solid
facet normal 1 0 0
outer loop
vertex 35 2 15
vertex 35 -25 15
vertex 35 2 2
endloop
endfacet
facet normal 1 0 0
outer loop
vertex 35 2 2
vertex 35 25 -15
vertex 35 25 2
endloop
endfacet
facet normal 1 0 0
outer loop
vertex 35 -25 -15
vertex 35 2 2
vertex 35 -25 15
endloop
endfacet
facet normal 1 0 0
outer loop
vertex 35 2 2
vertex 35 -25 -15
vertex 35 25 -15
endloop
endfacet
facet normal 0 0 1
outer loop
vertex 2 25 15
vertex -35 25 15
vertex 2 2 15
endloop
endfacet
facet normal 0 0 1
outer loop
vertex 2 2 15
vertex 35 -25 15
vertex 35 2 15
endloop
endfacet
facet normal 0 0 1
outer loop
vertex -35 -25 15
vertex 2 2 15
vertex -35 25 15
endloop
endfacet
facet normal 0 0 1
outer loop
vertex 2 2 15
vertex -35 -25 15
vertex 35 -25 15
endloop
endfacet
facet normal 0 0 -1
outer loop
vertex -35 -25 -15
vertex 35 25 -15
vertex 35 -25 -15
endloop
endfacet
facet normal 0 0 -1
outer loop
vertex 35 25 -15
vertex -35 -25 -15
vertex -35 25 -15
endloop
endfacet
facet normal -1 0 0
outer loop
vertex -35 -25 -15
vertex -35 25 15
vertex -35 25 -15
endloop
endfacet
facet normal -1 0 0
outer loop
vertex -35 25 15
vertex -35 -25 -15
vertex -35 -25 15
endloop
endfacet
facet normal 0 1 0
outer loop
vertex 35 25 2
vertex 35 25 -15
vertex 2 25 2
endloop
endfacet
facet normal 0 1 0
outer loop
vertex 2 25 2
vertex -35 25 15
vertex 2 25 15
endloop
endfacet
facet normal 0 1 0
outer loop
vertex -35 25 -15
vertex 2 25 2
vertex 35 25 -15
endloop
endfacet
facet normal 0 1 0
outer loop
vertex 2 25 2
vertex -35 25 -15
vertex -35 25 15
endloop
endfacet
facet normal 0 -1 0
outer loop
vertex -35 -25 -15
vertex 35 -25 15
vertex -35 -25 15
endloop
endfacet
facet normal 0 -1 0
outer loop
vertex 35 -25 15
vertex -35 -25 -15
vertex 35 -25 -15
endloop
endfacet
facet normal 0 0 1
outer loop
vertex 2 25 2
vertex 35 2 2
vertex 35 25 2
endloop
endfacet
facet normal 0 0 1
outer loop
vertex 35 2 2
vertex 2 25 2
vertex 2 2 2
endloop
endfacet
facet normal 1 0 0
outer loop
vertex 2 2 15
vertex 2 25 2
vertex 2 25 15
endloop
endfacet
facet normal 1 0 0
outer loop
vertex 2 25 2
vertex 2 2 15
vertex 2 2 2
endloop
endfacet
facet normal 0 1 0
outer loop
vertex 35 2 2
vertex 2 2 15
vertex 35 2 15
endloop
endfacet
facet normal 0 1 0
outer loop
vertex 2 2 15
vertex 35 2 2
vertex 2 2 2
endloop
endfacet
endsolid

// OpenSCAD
// Two-part enclosure for small electronics board
// Part 1: Box (left)
// Part 2: Lid (right, printed upside down)
// Prints together with a 10 mm gap.

// --- Dimensions ---
// Box Outer Dimensions (X x Y x Z)
$box_outer_x = 70;
$box_outer_y = 50;
$box_outer_z = 30;

// Wall and Floor Thickness
$wall_thickness = 2;
$floor_thickness = 2;

// Lid Dimensions
// Plate thickness
$plate_thickness = 2;
// Lip dimensions (height and wall thickness)
$lip_height = 4;
$lip_wall_thickness = 1.5;
// Lip outer size (X x Y)
$lip_outer_x = 65.6;
$lip_outer_y = 45.6;

// Clearance
$clearance = 0.2;

// Gap between parts
$gap = 10;

// --- Configuration ---
// Set global resolution for curved shapes
$fn = 64;

// --- Part 1: The Box ---
// Position: Centered on its own footprint, then shifted left by half the gap.
// Footprint: $box_outer_x by $box_outer_y
$box_x_pos = -($gap / 2) - ($box_outer_x / 2);
$box_y_pos = 0;

difference() {
    // Main outer block
    cube([
        $box_outer_x, 
        $box_outer_y, 
        $box_outer_z
    ], center = true);
    
    // Cut out the interior (open top)
    translate([
        $wall_thickness, 
        $wall_thickness, 
        $floor_thickness
    ]) {
        cube([
            $box_outer_x - (2 * $wall_thickness),
            $box_outer_y - (2 * $wall_thickness),
            $box_outer_z - $floor_thickness
        ]);
    }
    
    // Extend cut slightly to ensure clean separation
    translate([
        $wall_thickness, 
        $wall_thickness, 
        $floor_thickness
    ]) {
        cube([
            $box_outer_x - (2 * $wall_thickness) + 0.1,
            $box_outer_y - (2 * $wall_thickness) + 0.1,
            $box_outer_z - $floor_thickness + 0.1
        ]);
    }
}

// --- Part 2: The Lid ---
// Position: Centered on its own footprint, then shifted right by half the gap + box width.
// Footprint: $lip_outer_x by $lip_outer_y
$gap_total = $gap + $box_outer_x;
$lid_x_pos = ($gap_total / 2) - ($lip_outer_x / 2);
$lid_y_pos = 0;

// The lid is printed upside down relative to the box opening logic, 
// but physically it sits on the bed as a plate with a lip.
// We model it as a plate with a raised lip.

difference() {
    // 1. The main plate (70x50x2)
    cube([
        $lip_outer_x, 
        $lip_outer_y, 
        $plate_thickness
    ], center = true);
    
    // 2. The Lip (raised wall)
    // The lip sits on top of the plate.
    // Lip outer size: 65.6 x 45.6
    // Lip wall thickness: 1.5
    // Lip height: 4
    // We need to cut the hole for the lip out of the plate, then add the lip wall.
    // Actually, easier approach: Create the solid plate, then subtract the hole where the lip goes, 
    // then add the lip wall on top.
    
    // Step 2a: Cut the hole for the lip in the plate
    // Hole size = Lip Outer Size - 2 * Lip Wall Thickness
    $lip_inner_x = $lip_outer_x - (2 * $lip_wall_thickness);
    $lip_inner_y = $lip_outer_y - (2 * $lip_wall_thickness);
    
    translate([
        0, 
        0, 
        $plate_thickness
    ]) {
        // Cut the hole through the plate
        cube([
            $lip_inner_x, 
            $lip_inner_y, 
            $plate_thickness + 1 // Extend past bottom to ensure clean cut
        ]);
    }
    
    // Step 2b: Add the Lip Wall
    // The lip is a hollow box sitting on the plate.
    // Outer: 65.6 x 45.6 x 4
    // Inner: 65.6 - 3 = 62.6 x 45.6 - 3 = 42.6 x 4 (height)
    // Floor of lip: 1.5 thick
    
    translate([
        0, 
        0, 
        $plate_thickness
    ]) {
        // Solid block for the lip outer dimensions
        cube([
            $lip_outer_x, 
            $lip_outer_y, 
            $lip_height
        ]);
        
        // Cut out the inner void of the lip
        translate([
            $lip_wall_thickness, 
            $lip_wall_thickness, 
            $lip_wall_thickness
        ]) {
            cube([
                $lip_inner_x, 
                $lip_inner_y, 
                $lip_height - $lip_wall_thickness
            ]);
        }
        
        // Extend cut slightly to ensure clean separation from plate
        translate([
            $lip_wall_thickness, 
            $lip_wall_thickness, 
            $lip_wall_thickness
        ]) {
            cube([
                $lip_inner_x + 0.1, 
                $lip_inner_y + 0.1, 
                $lip_height - $lip_wall_thickness + 0.1
            ]);
        }
    }
}
